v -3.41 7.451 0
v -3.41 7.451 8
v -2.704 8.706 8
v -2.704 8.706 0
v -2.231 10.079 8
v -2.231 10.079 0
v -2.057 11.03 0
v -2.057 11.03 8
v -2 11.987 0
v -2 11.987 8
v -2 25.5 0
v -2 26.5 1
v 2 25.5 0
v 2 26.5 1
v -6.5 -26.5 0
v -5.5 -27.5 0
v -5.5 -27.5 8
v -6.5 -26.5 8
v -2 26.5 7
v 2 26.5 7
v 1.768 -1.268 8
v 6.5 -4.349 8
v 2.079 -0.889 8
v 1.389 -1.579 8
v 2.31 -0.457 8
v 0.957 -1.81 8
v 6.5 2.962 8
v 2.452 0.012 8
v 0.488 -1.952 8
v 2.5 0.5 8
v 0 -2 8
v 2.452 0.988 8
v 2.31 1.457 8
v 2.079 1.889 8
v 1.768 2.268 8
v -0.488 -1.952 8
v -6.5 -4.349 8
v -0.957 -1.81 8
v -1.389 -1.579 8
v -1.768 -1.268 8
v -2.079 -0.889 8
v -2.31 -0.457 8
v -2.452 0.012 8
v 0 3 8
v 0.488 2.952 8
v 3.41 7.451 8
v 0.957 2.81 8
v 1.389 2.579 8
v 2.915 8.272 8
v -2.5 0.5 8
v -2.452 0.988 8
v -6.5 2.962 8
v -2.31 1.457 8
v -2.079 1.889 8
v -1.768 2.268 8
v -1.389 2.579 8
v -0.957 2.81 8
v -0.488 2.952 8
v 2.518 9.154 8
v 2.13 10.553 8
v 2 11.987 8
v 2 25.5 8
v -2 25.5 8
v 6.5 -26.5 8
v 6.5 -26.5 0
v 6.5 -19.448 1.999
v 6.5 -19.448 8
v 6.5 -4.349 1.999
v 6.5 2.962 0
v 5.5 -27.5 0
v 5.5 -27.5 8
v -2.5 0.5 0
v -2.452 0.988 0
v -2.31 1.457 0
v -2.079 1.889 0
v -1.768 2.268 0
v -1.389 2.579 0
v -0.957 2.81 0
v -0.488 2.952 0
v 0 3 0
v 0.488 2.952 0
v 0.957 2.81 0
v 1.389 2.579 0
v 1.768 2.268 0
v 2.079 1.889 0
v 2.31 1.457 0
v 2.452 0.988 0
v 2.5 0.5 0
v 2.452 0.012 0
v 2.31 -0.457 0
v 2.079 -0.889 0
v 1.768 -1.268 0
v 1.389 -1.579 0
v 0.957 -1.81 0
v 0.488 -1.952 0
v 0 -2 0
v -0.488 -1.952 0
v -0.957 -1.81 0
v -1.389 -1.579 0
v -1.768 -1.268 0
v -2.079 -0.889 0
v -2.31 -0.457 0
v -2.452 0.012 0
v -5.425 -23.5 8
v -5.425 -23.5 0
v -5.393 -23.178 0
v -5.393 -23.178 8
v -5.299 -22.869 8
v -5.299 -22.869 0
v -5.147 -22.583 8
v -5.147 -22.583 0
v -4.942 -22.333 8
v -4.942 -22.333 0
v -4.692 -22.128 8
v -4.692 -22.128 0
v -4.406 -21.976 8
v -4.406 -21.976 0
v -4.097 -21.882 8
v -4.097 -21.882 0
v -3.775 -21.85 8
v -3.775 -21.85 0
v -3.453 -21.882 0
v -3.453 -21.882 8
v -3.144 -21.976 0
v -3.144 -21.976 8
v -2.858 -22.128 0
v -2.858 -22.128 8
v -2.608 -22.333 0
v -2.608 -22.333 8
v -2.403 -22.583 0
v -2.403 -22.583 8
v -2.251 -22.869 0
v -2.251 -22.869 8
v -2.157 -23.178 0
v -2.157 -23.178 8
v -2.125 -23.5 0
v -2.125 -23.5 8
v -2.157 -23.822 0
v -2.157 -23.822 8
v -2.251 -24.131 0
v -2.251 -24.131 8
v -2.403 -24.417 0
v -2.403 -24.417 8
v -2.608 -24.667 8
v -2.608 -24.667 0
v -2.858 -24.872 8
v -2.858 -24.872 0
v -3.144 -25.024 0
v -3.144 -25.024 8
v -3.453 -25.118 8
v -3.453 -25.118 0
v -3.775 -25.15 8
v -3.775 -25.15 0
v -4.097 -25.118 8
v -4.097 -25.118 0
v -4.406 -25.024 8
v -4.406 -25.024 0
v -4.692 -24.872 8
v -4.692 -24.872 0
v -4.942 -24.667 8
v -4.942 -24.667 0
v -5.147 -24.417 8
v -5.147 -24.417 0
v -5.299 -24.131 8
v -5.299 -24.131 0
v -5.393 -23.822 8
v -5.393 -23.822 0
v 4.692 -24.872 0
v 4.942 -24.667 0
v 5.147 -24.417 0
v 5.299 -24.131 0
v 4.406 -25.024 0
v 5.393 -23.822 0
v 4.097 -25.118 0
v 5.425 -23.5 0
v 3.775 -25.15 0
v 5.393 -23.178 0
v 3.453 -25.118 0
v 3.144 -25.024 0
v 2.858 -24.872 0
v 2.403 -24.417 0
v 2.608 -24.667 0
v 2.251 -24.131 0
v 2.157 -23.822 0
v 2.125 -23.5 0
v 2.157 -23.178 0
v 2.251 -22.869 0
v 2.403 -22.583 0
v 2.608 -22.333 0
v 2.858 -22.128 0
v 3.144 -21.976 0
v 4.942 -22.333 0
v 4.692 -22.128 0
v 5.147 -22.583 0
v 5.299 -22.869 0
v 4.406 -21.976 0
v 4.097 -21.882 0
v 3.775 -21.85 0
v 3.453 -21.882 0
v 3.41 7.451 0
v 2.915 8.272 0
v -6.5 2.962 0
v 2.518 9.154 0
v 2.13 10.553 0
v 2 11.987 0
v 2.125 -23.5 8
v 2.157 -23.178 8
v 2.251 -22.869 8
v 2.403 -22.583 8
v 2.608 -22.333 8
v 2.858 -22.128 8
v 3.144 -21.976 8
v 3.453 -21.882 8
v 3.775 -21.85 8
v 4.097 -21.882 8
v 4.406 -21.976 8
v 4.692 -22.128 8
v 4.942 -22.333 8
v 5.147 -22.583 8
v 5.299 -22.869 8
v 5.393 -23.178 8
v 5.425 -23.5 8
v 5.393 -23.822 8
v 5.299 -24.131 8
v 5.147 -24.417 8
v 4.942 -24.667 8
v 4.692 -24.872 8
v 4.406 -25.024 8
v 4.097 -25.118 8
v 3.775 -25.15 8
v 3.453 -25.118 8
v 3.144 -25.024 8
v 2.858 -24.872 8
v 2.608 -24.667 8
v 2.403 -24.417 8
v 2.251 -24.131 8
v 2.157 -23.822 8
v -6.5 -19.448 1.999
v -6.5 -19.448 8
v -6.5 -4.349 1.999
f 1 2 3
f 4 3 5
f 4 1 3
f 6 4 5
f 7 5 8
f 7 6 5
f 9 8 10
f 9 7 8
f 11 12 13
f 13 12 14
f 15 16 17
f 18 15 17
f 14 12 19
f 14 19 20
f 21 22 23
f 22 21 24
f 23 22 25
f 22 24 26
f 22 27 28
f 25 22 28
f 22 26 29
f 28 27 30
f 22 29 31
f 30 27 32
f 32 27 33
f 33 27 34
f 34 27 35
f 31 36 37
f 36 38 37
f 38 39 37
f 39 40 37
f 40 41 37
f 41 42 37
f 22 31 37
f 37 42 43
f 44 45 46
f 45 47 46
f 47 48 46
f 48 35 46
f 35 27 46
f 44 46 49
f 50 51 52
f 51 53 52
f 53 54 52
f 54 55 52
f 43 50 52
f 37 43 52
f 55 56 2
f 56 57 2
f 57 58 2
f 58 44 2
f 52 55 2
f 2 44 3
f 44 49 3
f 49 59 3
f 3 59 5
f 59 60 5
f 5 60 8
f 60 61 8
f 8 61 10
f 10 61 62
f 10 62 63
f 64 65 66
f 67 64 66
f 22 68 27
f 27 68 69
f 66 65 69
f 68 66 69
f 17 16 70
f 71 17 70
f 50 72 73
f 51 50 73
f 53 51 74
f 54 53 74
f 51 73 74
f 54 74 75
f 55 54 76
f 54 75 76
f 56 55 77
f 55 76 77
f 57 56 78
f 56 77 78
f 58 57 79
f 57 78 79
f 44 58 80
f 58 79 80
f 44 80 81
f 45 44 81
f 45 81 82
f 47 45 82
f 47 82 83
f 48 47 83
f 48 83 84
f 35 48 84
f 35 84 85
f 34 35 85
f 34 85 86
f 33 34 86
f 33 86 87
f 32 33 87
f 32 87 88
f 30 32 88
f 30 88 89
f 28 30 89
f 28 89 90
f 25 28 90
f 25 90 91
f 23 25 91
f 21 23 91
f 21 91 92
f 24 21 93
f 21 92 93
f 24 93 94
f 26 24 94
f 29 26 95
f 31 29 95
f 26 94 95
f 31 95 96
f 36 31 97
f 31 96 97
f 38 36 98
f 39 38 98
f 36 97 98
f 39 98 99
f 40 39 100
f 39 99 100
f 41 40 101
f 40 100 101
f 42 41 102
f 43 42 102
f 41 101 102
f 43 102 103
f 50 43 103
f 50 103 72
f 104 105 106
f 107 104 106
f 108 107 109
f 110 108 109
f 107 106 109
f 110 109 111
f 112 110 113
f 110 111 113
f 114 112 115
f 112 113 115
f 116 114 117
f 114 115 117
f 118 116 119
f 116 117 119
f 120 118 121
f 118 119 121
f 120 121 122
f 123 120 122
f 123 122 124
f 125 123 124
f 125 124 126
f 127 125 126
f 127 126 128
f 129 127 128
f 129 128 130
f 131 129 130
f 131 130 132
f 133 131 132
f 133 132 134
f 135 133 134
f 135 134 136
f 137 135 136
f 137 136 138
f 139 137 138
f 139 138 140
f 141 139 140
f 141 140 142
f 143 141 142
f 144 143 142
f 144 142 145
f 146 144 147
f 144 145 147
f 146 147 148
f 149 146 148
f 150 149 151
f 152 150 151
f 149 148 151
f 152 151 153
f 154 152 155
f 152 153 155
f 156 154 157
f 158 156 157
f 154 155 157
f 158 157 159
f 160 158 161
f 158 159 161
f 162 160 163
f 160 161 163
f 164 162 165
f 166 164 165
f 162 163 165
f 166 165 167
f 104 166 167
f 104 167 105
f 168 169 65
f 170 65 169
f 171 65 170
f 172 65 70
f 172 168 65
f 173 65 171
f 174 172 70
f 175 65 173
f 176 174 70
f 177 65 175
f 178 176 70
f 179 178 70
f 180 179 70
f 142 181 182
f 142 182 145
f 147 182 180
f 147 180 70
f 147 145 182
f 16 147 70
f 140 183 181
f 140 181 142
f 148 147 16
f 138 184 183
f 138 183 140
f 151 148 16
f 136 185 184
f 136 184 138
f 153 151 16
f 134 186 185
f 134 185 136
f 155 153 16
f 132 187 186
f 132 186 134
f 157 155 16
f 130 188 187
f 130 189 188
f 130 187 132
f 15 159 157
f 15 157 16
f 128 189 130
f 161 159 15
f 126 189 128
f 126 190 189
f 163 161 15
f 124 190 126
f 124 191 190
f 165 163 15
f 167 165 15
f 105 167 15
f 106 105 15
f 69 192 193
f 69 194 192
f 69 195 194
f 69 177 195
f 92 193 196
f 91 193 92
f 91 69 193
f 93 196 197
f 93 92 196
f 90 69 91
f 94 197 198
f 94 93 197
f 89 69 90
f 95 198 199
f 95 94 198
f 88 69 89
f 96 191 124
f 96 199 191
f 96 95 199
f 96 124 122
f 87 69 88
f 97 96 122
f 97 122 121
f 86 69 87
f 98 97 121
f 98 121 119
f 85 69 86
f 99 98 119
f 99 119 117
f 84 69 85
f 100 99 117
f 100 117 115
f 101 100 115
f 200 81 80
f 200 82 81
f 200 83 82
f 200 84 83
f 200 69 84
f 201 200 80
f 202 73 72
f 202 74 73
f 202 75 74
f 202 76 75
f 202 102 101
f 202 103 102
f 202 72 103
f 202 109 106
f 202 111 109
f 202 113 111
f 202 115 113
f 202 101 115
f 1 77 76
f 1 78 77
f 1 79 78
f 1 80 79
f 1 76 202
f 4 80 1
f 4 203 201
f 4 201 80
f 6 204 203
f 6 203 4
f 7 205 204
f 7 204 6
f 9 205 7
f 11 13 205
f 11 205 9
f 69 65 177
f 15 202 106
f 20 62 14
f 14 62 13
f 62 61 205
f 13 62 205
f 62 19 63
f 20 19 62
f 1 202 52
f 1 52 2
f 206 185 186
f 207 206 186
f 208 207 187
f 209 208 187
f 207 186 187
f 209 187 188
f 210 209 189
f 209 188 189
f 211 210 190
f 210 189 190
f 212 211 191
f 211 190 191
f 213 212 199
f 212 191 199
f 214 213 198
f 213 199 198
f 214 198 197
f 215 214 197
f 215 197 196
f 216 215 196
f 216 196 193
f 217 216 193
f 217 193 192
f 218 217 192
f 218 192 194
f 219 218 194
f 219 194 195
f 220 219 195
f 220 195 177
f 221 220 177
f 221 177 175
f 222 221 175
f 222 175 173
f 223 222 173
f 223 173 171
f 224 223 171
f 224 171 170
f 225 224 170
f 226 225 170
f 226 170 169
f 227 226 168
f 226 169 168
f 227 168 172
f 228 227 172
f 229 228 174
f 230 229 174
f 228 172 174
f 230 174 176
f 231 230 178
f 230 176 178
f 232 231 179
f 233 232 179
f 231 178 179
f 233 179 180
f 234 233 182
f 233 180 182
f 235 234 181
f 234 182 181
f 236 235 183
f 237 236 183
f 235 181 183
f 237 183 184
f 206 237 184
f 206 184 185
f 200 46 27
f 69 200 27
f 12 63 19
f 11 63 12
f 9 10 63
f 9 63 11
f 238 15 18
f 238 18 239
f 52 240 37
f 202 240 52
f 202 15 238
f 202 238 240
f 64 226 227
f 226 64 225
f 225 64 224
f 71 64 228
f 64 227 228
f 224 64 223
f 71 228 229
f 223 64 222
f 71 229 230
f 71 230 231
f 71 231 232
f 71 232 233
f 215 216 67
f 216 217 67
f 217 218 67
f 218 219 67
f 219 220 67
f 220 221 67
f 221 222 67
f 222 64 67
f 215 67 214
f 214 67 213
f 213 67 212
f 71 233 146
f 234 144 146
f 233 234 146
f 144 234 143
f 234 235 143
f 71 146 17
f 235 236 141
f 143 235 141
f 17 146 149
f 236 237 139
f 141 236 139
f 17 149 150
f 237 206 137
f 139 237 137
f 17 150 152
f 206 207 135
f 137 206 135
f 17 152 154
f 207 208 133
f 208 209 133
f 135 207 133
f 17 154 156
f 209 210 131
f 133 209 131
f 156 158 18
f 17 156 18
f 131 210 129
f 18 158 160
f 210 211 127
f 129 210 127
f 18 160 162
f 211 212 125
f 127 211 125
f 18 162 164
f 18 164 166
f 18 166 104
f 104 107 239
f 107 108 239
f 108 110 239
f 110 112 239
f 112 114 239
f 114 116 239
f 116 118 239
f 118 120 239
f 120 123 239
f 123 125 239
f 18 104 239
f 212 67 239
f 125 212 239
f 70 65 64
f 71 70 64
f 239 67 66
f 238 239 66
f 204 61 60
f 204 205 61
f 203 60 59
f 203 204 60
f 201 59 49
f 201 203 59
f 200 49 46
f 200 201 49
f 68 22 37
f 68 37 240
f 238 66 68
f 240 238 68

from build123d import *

# Parameters (mm, degrees)
ESQUISSE1_W                             = 13
ESQUISSE1_H                             = 55
BOSS_EXTRU_1_DEPTH                      = 8
TROUS_DE_CENTRAGE_5_0MMTRANSITIONAL_1_D = 5
ESQUISSE4_W                             = 4.5
ESQUISSE4_H                             = 20
ENL_V_MAT_EXTRU_1_DEPTH                 = 30.368350311
CONG_1_R                                = 2
CHANFREIN1_SIZE                         = 1
TROU_TARAUD_M41_D                       = 3.3
CHANFREIN2_START                        = -1
CHANFREIN2_DEPTH                        = 10
ESQUISSE9_W                             = 8
ESQUISSE9_H                             = 8
ENL_V_MAT_EXTRU_2_DEPTH                 = 30.874738493
ESQUISSE10_W                            = 4
ESQUISSE10_H                            = 8
BOSS_EXTRU_2_DEPTH                      = 7
CHANFREIN3_SIZE                         = 1
BOSS_EXTRU_3_START                      = -8
BOSS_EXTRU_3_DEPTH                      = 8
CONG_2_R                                = 8
ESQUISSE12_W                            = 6.001123603
ESQUISSE12_H                            = 15.09853113
ENL_V_MAT_EXTRU_3_DEPTH                 = 32.452345059


with BuildPart() as part:
    # Esquisse1 → Boss.-Extru.1 (new body)
    with BuildSketch(Plane.XY):
        Rectangle(ESQUISSE1_W, ESQUISSE1_H)
    extrude(amount=BOSS_EXTRU_1_DEPTH)

    # Trous de centrage Ø5.0mmTransitional 1 (through all)
    with Locations(Plane.XY.offset(8)):
        with Locations((0, 0.5)):
            Hole(TROUS_DE_CENTRAGE_5_0MMTRANSITIONAL_1_D / 2)

    # Esquisse4 → Enlèv. mat.-Extru.1 (cut, through all)
    with BuildSketch(Plane.XY.offset(8)):
        with Locations((4.25, 17.5)):
            Rectangle(ESQUISSE4_W, ESQUISSE4_H)
        with Locations((-4.25, 17.5)):
            Rectangle(ESQUISSE4_W, ESQUISSE4_H)
    extrude(amount=-ENL_V_MAT_EXTRU_1_DEPTH, mode=Mode.SUBTRACT)

    # Congé1
    cong_1_edges = [part.edges().sort_by_distance(p)[0] for p in [
        (2, 7.5, 4),
        (-2, 7.5, 4),
    ]]
    fillet(cong_1_edges, radius=CONG_1_R)

    # Chanfrein1
    chanfrein1_edges = [part.edges().sort_by_distance(p)[0] for p in [
        (6.5, -27.5, 4),
        (-6.5, -27.5, 4),
    ]]
    chamfer(chanfrein1_edges, length=CHANFREIN1_SIZE)

    # Trou taraudé M41 (through all)
    with Locations(Plane.XY.offset(8)):
        with Locations((-3.775, -23.5), (3.775, -23.5)):
            Hole(TROU_TARAUD_M41_D / 2)

    # Chanfrein2: read off the stored shape, not the designer's step
    # Chanfrein2 outline → Chanfrein2 (cut)
    with BuildSketch(Plane.XY.offset(CHANFREIN2_START)):
        with BuildLine():
            Line((3.285714286, 7.631900453), (6.5, 2.961651585))
            Line((6.5, 2.961651585), (6.5, 7.5))
            Line((6.5, 7.5), (4, 7.5))
            ThreePointArc((4, 7.5), (3.636818981, 7.533251529), (3.285714286, 7.631900453))
        make_face()
        with BuildLine():
            Line((-6.5, 2.961651585), (-3.285714286, 7.631900453))
            ThreePointArc((-3.285714286, 7.631900453), (-3.636818981, 7.533251529), (-4, 7.5))
            Line((-4, 7.5), (-6.5, 7.5))
            Line((-6.5, 7.5), (-6.5, 2.961651585))
        make_face()
    extrude(amount=CHANFREIN2_DEPTH, mode=Mode.SUBTRACT)

    # Esquisse9 → Enlèv. mat.-Extru.2 (cut, through all)
    with BuildSketch(Plane.ZY.offset(2)):
        with Locations((4, 23.5)):
            Rectangle(ESQUISSE9_W, ESQUISSE9_H)
    extrude(amount=-ENL_V_MAT_EXTRU_2_DEPTH, mode=Mode.SUBTRACT)

    # Esquisse10 → Boss.-Extru.2 (add)
    with BuildSketch(Plane(origin=(0, 19.5, 0), x_dir=(1, 0, 0), z_dir=(0, 1, 0))):
        with Locations((0, -4)):
            Rectangle(ESQUISSE10_W, ESQUISSE10_H)
    extrude(amount=BOSS_EXTRU_2_DEPTH)

    # Chanfrein3
    chanfrein3_edges = [part.edges().sort_by_distance(p)[0] for p in [
        (0, 26.5, 0),
        (0, 26.5, 8),
    ]]
    chamfer(chanfrein3_edges, length=CHANFREIN3_SIZE)

    # Esquisse11 → Boss.-Extru.3 (add)
    with BuildSketch(Plane.XY.offset(8).offset(BOSS_EXTRU_3_START)):
        with BuildLine():
            Line((-3.285714286, 7.631900453), (-2, 9.5))
            ThreePointArc((-2, 9.5), (-2.352491058, 8.366106581), (-3.285714286, 7.631900453))
        make_face()
        with BuildLine():
            Line((3.285714286, 7.631900453), (2, 9.5))
            ThreePointArc((2, 9.5), (2.352491058, 8.366106581), (3.285714286, 7.631900453))
        make_face()
    extrude(amount=BOSS_EXTRU_3_DEPTH)

    # Congé2
    cong_2_edges = [part.edges().sort_by_distance(p)[0] for p in [
        (-2, 9.5, 4),
        (2, 9.5, 4),
    ]]
    fillet(cong_2_edges, radius=CONG_2_R)

    # Esquisse12 → Enlèv. mat.-Extru.3 (cut, through all)
    with BuildSketch(Plane(origin=(6.5, 0, 0), x_dir=(0, 0, -1), z_dir=(1, 0, 0))):
        with Locations((-4.999438199, -11.898438915)):
            Rectangle(ESQUISSE12_W, ESQUISSE12_H)
    extrude(amount=-ENL_V_MAT_EXTRU_3_DEPTH, mode=Mode.SUBTRACT)


solid = part.part
